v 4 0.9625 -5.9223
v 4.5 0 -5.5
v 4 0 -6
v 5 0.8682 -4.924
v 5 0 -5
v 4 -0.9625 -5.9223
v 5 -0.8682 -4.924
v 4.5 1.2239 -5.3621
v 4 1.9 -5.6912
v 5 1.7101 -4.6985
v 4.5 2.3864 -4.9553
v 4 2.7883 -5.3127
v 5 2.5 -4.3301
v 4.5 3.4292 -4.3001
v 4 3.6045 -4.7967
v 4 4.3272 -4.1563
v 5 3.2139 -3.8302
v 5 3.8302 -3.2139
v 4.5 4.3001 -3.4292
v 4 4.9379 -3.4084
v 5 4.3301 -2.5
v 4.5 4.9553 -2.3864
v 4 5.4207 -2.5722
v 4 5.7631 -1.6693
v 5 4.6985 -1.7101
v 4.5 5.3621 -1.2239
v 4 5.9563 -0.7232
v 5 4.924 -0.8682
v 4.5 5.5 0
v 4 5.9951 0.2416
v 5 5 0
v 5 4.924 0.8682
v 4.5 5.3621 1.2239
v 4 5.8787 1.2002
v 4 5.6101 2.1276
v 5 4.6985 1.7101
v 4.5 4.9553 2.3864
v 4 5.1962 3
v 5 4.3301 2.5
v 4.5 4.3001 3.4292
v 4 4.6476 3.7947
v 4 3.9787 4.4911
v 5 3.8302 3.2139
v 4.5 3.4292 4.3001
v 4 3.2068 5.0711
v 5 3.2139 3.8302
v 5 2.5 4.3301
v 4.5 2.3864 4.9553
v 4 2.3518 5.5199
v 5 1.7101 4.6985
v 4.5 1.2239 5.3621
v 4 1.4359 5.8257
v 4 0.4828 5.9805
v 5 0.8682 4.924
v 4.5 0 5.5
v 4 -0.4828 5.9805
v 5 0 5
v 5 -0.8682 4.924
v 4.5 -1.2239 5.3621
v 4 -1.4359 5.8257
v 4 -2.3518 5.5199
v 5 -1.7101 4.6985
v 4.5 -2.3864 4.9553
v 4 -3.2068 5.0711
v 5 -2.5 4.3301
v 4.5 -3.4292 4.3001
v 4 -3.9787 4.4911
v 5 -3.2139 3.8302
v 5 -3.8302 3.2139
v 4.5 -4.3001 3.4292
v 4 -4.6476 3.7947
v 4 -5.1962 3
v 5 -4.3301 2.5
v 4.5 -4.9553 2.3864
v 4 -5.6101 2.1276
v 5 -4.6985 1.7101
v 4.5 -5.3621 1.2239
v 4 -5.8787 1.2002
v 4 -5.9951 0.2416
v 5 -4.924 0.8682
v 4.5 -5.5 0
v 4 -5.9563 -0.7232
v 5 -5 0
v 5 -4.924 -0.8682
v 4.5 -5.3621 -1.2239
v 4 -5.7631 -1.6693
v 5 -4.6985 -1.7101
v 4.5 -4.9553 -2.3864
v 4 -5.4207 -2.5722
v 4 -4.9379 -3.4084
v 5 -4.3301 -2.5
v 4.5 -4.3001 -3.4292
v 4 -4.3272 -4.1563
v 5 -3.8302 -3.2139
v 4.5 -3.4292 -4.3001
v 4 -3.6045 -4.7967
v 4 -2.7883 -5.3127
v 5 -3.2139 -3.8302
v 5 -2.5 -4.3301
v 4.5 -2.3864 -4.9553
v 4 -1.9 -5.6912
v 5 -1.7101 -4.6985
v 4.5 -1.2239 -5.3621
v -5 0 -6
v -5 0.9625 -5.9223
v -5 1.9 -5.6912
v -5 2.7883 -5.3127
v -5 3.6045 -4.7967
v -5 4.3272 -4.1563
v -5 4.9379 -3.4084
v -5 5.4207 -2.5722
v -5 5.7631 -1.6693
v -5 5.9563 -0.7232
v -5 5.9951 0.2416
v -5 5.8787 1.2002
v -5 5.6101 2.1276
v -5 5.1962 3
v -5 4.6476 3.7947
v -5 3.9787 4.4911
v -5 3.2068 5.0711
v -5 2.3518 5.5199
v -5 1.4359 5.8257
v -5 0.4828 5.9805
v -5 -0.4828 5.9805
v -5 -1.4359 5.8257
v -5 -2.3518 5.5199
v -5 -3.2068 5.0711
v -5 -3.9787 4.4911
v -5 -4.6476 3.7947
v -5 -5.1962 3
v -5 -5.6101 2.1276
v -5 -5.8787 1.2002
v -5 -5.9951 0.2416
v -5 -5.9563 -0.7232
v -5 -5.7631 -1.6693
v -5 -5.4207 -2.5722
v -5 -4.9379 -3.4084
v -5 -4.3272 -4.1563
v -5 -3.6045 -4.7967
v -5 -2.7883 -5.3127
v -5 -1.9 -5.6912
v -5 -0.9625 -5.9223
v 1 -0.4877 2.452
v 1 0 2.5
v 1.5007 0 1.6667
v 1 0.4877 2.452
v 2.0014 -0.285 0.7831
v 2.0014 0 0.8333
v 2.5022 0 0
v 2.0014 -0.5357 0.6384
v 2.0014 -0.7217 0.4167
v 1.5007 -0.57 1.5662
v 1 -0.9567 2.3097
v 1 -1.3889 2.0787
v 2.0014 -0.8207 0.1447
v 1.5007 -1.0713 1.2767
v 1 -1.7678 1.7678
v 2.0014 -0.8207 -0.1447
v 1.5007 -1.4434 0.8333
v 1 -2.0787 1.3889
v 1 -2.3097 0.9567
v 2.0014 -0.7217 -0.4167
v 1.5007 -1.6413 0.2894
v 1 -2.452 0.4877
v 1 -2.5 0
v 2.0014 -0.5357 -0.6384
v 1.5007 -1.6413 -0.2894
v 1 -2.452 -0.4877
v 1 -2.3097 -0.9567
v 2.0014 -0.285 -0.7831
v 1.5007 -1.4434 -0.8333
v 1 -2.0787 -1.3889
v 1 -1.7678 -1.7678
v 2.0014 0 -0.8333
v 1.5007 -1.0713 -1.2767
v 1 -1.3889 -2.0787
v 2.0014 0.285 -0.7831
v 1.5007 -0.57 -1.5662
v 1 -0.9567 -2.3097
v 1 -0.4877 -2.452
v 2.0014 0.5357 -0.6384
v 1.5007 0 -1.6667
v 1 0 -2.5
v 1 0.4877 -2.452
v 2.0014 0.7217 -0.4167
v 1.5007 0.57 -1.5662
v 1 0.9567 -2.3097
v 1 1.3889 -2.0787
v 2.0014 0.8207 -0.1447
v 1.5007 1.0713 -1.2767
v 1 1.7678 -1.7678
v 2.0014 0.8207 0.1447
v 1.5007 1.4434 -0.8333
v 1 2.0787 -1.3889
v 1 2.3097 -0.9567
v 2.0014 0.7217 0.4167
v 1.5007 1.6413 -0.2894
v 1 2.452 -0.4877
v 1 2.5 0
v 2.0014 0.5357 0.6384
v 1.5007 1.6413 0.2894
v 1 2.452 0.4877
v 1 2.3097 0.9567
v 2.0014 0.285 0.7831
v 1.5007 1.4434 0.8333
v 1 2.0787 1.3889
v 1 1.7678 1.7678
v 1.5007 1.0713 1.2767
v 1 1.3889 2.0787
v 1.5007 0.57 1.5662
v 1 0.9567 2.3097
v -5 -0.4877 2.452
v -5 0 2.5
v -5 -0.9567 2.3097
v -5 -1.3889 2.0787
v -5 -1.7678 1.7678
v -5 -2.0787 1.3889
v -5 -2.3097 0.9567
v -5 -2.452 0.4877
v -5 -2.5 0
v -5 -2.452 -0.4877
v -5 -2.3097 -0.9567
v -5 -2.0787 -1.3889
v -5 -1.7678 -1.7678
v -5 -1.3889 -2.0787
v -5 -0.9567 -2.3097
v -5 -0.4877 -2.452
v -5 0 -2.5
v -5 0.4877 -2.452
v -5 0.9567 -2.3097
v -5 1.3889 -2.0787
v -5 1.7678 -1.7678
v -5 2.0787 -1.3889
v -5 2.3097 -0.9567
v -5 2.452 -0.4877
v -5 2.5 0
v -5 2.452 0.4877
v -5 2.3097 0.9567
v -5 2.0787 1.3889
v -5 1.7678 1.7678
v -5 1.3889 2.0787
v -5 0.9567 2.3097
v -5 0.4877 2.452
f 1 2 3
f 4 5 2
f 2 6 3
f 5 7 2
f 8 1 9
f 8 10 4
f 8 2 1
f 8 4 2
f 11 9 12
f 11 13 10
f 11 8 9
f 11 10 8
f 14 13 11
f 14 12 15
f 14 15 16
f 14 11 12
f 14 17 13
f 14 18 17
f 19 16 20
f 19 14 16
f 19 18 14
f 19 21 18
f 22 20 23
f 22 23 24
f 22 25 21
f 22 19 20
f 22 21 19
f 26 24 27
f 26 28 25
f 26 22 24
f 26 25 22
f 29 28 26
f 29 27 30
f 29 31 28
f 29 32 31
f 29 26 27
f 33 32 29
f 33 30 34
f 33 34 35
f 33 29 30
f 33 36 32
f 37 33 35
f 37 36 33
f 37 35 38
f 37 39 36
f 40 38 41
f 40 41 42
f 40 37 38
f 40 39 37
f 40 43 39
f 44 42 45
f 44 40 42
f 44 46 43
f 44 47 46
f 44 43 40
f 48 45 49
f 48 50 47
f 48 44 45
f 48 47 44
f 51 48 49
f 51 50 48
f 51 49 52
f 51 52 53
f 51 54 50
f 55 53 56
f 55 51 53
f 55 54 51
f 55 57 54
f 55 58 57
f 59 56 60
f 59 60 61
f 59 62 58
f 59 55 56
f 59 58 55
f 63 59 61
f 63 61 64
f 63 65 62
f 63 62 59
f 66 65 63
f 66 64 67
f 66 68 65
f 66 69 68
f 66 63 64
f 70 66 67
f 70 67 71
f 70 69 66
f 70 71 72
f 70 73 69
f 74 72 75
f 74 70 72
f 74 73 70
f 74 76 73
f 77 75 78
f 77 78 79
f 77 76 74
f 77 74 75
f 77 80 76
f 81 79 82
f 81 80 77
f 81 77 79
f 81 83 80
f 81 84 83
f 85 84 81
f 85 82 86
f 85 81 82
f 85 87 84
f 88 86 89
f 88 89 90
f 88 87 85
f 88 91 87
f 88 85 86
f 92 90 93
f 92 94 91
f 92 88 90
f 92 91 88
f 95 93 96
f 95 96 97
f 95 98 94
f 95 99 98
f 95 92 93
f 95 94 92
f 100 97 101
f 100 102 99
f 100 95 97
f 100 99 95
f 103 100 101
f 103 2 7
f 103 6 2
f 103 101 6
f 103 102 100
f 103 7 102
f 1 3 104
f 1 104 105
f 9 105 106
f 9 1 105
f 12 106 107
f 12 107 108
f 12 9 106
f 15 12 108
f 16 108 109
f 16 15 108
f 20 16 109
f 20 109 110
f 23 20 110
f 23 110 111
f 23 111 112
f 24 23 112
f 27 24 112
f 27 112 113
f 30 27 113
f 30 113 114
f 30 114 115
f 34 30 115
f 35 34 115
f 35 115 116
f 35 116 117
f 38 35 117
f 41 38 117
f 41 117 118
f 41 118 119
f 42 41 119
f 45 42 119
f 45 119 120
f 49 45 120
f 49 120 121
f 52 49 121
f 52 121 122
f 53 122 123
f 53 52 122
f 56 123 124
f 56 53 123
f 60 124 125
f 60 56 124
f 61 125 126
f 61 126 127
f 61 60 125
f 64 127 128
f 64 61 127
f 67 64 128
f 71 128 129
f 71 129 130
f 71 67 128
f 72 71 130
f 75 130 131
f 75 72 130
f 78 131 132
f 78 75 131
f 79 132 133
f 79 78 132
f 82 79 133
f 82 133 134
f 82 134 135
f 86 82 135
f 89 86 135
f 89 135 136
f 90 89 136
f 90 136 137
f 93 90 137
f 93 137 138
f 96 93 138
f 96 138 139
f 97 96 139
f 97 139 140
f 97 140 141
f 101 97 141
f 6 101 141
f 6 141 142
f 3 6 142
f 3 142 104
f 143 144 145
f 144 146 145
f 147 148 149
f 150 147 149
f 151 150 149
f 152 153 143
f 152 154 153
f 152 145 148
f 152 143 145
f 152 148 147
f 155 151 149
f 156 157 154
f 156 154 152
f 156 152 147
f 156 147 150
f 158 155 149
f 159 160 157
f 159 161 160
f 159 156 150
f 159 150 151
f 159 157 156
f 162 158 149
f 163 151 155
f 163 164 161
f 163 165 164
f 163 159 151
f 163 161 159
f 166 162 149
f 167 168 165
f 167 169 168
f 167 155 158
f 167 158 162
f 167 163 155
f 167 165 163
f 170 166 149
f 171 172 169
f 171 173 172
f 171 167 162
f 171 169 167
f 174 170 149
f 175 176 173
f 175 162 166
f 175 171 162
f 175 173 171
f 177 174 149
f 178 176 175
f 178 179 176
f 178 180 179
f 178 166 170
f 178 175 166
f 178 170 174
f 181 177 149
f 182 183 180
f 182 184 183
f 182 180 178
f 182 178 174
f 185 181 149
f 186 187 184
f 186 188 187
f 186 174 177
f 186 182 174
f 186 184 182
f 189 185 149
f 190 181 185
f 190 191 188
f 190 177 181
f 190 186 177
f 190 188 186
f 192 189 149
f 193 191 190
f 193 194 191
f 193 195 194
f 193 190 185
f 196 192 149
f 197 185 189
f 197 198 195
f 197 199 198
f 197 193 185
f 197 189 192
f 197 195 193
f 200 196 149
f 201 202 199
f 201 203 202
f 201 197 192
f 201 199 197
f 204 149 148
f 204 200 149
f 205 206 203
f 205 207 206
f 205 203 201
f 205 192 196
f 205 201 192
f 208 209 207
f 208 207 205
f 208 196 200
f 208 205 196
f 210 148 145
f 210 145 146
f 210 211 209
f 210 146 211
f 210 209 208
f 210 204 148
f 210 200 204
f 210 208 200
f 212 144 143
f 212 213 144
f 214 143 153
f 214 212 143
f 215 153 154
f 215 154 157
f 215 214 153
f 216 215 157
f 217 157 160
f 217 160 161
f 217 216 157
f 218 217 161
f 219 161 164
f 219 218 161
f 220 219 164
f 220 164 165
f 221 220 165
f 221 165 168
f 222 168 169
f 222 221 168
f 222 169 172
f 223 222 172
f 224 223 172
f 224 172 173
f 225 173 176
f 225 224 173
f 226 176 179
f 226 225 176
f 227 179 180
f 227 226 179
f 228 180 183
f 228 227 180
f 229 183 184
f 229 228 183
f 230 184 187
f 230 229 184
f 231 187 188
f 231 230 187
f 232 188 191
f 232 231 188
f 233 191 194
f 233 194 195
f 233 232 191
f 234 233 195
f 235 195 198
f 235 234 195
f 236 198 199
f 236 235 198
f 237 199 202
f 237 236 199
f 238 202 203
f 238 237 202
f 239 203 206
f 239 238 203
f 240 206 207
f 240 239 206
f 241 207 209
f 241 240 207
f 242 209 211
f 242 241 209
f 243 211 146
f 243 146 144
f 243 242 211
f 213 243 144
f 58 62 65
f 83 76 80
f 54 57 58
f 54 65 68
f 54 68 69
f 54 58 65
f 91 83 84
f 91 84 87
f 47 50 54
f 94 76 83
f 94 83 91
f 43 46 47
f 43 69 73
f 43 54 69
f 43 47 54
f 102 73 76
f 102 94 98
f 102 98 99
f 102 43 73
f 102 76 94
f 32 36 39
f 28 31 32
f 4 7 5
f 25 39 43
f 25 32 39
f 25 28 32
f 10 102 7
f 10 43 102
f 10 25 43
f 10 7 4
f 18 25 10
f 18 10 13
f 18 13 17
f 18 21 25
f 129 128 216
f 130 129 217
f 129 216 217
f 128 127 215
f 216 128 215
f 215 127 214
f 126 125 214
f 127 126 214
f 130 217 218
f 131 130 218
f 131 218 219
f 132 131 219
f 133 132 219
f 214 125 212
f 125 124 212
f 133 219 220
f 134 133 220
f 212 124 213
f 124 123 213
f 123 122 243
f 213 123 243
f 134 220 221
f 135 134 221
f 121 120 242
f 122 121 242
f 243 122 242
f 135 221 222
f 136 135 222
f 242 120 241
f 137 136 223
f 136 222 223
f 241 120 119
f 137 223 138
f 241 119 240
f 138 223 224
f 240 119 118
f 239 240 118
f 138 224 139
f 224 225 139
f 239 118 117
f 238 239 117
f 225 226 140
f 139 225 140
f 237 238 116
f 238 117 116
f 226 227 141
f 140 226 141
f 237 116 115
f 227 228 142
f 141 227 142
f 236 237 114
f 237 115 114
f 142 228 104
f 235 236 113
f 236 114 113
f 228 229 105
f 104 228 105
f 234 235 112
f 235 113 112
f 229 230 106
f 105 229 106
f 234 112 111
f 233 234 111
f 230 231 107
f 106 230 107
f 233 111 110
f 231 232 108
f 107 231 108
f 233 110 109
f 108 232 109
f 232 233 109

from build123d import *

# Parameters (mm, degrees)
SKETCH1_R           = 6
BOSS_EXTRUDE2_DEPTH = 5
CHAMFER1_SIZE       = 1


with BuildPart() as part:
    # Sketch1 → Boss-Extrude2 (new body, symmetric)
    with BuildSketch(Plane(origin=(0, 0, 0), x_dir=(0, 0, -1), z_dir=(1, 0, 0))):
        Circle(SKETCH1_R)
    extrude(amount=BOSS_EXTRUDE2_DEPTH, both=True)

    # Sketch5 → M6x1.0 Tapped Hole1 (revolve, cut)
    with BuildSketch(Plane(origin=(-5, 0, 0), x_dir=(0, 0, 1), z_dir=(0, 1, 0))):
        Polygon((0, 0), (0, 7.502151548), (2.5, 6), (2.5, 0), align=None)
    revolve(axis=Axis((-11.35, 0, 0), (1, 0, 0)), mode=Mode.SUBTRACT)

    # Chamfer1
    chamfer1_edges = [part.edges().sort_by_distance(p)[0] for p in [
        (5, 0, 6),
    ]]
    chamfer(chamfer1_edges, length=CHAMFER1_SIZE)


solid = part.part
